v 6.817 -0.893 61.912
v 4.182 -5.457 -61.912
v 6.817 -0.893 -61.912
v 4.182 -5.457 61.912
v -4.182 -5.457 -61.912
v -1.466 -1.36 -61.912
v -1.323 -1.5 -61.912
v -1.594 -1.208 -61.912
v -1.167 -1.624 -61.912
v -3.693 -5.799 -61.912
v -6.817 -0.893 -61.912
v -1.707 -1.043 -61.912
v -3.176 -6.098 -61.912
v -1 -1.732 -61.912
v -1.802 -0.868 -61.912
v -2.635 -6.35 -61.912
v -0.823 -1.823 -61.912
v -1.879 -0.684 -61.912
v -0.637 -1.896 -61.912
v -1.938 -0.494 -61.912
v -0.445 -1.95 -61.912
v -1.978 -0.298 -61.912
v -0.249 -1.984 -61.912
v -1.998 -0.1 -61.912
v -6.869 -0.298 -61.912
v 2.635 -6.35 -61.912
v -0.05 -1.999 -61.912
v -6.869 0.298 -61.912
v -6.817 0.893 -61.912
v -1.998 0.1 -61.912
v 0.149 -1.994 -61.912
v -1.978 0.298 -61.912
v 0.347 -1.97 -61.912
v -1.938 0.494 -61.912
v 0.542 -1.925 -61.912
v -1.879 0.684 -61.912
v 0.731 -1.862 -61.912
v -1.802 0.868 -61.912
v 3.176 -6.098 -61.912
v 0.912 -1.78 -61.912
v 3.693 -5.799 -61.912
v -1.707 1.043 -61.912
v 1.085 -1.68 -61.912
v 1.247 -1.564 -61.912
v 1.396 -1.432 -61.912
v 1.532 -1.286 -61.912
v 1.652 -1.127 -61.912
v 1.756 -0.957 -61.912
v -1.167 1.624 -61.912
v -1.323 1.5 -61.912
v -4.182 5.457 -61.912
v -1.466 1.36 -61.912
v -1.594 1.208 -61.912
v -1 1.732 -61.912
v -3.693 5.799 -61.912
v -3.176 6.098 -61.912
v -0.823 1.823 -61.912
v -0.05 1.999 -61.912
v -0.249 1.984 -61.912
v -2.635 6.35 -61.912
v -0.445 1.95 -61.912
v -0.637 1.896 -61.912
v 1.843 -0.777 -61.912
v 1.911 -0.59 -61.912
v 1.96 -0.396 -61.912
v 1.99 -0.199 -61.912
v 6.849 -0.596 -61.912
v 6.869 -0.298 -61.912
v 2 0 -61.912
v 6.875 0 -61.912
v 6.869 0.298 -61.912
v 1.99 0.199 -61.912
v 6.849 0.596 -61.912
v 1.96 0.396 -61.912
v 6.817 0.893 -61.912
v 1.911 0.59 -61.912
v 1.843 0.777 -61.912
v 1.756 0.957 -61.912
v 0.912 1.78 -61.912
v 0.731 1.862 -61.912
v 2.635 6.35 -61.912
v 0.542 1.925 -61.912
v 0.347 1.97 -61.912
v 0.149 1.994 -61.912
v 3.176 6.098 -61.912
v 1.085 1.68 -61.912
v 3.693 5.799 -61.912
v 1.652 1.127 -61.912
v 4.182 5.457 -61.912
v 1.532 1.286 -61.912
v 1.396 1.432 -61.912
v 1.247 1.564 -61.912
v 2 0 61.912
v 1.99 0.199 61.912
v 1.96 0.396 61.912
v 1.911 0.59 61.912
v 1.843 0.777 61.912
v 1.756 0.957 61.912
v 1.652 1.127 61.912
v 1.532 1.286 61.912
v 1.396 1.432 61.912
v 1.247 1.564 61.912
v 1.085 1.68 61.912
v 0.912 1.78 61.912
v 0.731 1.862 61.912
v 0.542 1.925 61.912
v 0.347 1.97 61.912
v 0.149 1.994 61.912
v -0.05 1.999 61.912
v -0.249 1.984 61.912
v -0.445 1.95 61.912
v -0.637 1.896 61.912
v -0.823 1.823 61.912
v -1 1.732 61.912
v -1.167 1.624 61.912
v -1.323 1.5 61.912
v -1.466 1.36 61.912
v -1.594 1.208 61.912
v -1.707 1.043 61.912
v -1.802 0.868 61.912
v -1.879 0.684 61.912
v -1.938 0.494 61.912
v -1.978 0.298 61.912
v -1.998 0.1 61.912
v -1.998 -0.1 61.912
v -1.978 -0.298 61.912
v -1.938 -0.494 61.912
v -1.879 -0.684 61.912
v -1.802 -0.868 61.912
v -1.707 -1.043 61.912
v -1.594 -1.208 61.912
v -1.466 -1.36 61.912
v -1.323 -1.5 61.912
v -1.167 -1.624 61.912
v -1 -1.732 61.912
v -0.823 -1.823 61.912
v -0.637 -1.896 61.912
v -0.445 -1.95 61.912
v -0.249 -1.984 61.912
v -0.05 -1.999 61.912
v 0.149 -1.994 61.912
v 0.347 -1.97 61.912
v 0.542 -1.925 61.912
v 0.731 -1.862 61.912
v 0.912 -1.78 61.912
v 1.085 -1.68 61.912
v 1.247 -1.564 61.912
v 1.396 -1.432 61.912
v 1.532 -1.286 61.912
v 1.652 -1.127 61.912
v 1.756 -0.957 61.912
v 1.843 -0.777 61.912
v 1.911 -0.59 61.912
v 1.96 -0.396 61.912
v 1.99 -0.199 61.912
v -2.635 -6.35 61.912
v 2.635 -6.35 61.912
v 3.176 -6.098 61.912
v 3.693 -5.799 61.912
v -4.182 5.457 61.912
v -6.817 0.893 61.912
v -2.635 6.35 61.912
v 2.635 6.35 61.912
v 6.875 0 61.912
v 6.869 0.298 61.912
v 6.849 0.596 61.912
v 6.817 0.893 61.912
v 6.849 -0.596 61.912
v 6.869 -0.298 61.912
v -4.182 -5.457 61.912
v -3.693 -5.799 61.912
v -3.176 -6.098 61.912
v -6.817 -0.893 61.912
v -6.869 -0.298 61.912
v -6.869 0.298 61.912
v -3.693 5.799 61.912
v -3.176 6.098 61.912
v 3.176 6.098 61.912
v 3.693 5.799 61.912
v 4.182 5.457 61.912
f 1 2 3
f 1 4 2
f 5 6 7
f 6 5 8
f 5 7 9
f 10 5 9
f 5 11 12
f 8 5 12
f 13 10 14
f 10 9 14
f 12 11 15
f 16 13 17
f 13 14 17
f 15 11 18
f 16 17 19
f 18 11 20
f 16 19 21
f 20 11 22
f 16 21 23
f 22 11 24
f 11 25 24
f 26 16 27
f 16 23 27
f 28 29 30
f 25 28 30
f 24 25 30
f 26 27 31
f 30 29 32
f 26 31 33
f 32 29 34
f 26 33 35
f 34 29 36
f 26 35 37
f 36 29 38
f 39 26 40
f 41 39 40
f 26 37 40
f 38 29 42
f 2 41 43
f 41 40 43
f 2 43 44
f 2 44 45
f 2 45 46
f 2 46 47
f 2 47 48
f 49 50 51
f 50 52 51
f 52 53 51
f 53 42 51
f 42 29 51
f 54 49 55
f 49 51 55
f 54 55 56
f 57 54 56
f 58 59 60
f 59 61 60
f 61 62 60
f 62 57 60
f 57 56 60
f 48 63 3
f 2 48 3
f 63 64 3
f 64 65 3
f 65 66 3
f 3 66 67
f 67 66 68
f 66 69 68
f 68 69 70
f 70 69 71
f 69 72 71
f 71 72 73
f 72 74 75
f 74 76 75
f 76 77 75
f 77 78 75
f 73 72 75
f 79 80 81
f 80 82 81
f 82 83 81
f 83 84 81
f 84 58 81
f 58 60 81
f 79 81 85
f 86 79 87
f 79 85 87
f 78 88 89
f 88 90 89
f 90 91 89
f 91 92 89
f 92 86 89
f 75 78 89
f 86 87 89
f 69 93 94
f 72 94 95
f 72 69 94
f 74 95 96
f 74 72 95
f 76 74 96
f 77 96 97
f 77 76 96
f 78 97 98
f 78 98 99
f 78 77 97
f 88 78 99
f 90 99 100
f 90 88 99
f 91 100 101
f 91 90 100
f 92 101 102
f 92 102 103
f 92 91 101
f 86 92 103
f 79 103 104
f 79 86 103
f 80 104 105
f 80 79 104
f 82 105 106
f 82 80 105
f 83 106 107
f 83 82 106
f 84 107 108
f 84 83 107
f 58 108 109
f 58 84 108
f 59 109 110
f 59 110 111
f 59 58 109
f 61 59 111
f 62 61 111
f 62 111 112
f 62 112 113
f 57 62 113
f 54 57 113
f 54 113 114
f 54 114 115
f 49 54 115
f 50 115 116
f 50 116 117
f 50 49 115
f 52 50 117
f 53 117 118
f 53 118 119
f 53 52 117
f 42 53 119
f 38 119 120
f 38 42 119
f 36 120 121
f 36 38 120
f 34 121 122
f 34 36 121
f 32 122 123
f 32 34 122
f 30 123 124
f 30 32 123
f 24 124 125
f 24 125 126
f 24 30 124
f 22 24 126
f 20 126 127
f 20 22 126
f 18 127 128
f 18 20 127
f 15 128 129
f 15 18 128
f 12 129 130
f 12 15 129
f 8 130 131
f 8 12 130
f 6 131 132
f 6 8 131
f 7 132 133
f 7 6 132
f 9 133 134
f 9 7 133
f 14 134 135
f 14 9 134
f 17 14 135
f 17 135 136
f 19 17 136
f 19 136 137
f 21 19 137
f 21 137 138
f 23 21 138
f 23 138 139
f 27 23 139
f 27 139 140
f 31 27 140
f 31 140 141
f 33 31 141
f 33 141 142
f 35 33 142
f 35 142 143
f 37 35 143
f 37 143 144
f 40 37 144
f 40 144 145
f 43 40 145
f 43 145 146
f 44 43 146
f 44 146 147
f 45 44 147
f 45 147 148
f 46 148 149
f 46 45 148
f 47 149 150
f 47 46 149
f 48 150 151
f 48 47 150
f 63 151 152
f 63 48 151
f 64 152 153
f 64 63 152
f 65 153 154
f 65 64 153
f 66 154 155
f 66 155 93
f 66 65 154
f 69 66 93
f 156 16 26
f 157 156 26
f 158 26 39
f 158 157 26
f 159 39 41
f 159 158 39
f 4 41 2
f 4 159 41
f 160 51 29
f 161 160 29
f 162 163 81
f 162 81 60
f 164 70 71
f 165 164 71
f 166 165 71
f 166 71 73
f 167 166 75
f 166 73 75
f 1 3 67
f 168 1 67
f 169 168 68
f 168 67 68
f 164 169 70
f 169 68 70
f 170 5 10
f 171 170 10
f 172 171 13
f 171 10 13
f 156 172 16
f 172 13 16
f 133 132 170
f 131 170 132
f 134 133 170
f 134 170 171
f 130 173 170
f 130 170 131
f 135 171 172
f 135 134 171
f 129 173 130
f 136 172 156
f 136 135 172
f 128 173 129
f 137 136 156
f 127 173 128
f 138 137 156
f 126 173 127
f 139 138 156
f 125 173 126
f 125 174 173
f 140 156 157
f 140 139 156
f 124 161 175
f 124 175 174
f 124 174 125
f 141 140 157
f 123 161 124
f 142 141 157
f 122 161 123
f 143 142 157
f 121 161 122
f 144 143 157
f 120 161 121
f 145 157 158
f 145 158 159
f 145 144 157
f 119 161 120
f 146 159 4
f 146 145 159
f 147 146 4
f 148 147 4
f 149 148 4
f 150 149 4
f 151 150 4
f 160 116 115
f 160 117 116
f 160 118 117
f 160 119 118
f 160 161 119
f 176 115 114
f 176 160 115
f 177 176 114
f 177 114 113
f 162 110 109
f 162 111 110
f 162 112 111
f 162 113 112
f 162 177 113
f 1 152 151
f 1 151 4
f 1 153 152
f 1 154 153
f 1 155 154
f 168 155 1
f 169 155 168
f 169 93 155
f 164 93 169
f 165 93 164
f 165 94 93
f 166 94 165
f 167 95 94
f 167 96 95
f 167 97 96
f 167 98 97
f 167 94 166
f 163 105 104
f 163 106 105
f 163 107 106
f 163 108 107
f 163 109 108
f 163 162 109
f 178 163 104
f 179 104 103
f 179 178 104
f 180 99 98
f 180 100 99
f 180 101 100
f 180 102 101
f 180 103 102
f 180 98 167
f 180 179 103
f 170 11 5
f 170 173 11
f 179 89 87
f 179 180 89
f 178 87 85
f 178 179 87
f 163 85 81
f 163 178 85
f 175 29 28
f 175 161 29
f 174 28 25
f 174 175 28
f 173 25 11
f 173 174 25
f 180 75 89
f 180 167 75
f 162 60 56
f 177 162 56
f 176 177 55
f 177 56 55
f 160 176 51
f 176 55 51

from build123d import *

# Parameters (mm, degrees)
SKETCH1_R           = 2.000000064
BOSS_EXTRUDE1_DEPTH = 61.9125


with BuildPart() as part:
    # Sketch1 → Boss-Extrude1 (new, symmetric)
    with BuildSketch(Plane.XY):
        with BuildLine():
            ThreePointArc((4.181770846, 5.456960429), (3.437499983, 5.953924622), (2.634980936, 6.35))
            Line((2.634980936, 6.35), (-2.634980936, 6.35))
            ThreePointArc((-2.634980936, 6.35), (-3.437499983, 5.953924622), (-4.181770846, 5.456960429))
            Line((-4.181770846, 5.456960429), (-6.816751782, 0.893039571))
            ThreePointArc((-6.816751782, 0.893039571), (-6.874999966, 0), (-6.816751782, -0.893039571))
            Line((-6.816751782, -0.893039571), (-4.181770846, -5.456960429))
            ThreePointArc((-4.181770846, -5.456960429), (-3.437499983, -5.953924622), (-2.634980936, -6.35))
            Line((-2.634980936, -6.35), (2.634980936, -6.35))
            ThreePointArc((2.634980936, -6.35), (3.437499983, -5.953924622), (4.181770846, -5.456960429))
            Line((4.181770846, -5.456960429), (6.816751782, -0.893039571))
            ThreePointArc((6.816751782, -0.893039571), (6.860422465, -0.447468582), (6.874999966, 0))
            ThreePointArc((6.874999966, 0), (6.860422465, 0.447468582), (6.816751782, 0.893039571))
            Line((6.816751782, 0.893039571), (4.181770846, 5.456960429))
        make_face()
        Circle(SKETCH1_R, mode=Mode.SUBTRACT)
    extrude(amount=BOSS_EXTRUDE1_DEPTH, both=True)


solid = part.part
